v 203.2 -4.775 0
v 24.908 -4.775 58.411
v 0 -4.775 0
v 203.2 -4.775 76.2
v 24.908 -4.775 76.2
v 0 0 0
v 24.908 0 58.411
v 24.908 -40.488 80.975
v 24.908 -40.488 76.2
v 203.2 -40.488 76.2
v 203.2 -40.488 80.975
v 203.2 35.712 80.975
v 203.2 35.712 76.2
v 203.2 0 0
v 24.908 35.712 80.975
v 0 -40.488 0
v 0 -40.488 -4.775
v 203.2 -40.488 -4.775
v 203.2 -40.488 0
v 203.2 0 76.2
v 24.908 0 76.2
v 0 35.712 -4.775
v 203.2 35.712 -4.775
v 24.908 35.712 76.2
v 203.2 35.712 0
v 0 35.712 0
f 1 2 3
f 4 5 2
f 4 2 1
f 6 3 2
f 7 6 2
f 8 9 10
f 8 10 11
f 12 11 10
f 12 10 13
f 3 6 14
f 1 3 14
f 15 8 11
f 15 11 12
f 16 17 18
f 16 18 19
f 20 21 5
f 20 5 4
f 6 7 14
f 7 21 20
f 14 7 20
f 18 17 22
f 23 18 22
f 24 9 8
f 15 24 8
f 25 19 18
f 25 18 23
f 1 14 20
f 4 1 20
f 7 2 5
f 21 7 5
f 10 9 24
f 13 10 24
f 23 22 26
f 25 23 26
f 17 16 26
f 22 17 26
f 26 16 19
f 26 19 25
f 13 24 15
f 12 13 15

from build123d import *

# Parameters (mm, degrees)
F0_W     = 203.2
F0_H     = 76.2
F1_DEPTH = 4.7752
F2_W     = 76.2
F2_H     = 4.7752
F3_DEPTH = 203.2
F4_W     = 24.907966
F4_H     = 4.7752
F5_DEPTH = 80.264


with BuildPart() as f1:
    # F0 (on Front) → F1 (new body)
    with BuildSketch(Plane.XZ):
        with Locations((101.6, 38.1)):
            Rectangle(F0_W, F0_H)
    extrude(amount=F1_DEPTH)


with BuildPart() as f3:
    # F2 (on Right) → F3 (new body)
    with BuildSketch(Plane.YZ):
        with Locations((-2.3876, 78.5876)):
            Rectangle(F2_W, F2_H)
        with Locations((-2.3876, -2.3876)):
            Rectangle(F2_W, F2_H)
    extrude(amount=F3_DEPTH)


with BuildPart() as f5_tool:
    # F4 (on face) → F5 (new body)
    with BuildSketch(Plane.XZ.offset(40.4876)):
        Polygon((0, 76.2), (0, 0), (24.907966, 58.410985), (24.907966, 76.2), align=None)
        with Locations((12.453983, 78.5876)):
            Rectangle(F4_W, F4_H)
    extrude(amount=-F5_DEPTH)


with BuildPart() as f1_1:
    add(f1.part)

    # F5: cut by f5_tool
    add(f5_tool.part, mode=Mode.SUBTRACT)


with BuildPart() as f3_1:
    add(f3.part)

    # F5: cut by f5_tool
    add(f5_tool.part, mode=Mode.SUBTRACT)


solid = Compound([f1_1.part, f3_1.part])
